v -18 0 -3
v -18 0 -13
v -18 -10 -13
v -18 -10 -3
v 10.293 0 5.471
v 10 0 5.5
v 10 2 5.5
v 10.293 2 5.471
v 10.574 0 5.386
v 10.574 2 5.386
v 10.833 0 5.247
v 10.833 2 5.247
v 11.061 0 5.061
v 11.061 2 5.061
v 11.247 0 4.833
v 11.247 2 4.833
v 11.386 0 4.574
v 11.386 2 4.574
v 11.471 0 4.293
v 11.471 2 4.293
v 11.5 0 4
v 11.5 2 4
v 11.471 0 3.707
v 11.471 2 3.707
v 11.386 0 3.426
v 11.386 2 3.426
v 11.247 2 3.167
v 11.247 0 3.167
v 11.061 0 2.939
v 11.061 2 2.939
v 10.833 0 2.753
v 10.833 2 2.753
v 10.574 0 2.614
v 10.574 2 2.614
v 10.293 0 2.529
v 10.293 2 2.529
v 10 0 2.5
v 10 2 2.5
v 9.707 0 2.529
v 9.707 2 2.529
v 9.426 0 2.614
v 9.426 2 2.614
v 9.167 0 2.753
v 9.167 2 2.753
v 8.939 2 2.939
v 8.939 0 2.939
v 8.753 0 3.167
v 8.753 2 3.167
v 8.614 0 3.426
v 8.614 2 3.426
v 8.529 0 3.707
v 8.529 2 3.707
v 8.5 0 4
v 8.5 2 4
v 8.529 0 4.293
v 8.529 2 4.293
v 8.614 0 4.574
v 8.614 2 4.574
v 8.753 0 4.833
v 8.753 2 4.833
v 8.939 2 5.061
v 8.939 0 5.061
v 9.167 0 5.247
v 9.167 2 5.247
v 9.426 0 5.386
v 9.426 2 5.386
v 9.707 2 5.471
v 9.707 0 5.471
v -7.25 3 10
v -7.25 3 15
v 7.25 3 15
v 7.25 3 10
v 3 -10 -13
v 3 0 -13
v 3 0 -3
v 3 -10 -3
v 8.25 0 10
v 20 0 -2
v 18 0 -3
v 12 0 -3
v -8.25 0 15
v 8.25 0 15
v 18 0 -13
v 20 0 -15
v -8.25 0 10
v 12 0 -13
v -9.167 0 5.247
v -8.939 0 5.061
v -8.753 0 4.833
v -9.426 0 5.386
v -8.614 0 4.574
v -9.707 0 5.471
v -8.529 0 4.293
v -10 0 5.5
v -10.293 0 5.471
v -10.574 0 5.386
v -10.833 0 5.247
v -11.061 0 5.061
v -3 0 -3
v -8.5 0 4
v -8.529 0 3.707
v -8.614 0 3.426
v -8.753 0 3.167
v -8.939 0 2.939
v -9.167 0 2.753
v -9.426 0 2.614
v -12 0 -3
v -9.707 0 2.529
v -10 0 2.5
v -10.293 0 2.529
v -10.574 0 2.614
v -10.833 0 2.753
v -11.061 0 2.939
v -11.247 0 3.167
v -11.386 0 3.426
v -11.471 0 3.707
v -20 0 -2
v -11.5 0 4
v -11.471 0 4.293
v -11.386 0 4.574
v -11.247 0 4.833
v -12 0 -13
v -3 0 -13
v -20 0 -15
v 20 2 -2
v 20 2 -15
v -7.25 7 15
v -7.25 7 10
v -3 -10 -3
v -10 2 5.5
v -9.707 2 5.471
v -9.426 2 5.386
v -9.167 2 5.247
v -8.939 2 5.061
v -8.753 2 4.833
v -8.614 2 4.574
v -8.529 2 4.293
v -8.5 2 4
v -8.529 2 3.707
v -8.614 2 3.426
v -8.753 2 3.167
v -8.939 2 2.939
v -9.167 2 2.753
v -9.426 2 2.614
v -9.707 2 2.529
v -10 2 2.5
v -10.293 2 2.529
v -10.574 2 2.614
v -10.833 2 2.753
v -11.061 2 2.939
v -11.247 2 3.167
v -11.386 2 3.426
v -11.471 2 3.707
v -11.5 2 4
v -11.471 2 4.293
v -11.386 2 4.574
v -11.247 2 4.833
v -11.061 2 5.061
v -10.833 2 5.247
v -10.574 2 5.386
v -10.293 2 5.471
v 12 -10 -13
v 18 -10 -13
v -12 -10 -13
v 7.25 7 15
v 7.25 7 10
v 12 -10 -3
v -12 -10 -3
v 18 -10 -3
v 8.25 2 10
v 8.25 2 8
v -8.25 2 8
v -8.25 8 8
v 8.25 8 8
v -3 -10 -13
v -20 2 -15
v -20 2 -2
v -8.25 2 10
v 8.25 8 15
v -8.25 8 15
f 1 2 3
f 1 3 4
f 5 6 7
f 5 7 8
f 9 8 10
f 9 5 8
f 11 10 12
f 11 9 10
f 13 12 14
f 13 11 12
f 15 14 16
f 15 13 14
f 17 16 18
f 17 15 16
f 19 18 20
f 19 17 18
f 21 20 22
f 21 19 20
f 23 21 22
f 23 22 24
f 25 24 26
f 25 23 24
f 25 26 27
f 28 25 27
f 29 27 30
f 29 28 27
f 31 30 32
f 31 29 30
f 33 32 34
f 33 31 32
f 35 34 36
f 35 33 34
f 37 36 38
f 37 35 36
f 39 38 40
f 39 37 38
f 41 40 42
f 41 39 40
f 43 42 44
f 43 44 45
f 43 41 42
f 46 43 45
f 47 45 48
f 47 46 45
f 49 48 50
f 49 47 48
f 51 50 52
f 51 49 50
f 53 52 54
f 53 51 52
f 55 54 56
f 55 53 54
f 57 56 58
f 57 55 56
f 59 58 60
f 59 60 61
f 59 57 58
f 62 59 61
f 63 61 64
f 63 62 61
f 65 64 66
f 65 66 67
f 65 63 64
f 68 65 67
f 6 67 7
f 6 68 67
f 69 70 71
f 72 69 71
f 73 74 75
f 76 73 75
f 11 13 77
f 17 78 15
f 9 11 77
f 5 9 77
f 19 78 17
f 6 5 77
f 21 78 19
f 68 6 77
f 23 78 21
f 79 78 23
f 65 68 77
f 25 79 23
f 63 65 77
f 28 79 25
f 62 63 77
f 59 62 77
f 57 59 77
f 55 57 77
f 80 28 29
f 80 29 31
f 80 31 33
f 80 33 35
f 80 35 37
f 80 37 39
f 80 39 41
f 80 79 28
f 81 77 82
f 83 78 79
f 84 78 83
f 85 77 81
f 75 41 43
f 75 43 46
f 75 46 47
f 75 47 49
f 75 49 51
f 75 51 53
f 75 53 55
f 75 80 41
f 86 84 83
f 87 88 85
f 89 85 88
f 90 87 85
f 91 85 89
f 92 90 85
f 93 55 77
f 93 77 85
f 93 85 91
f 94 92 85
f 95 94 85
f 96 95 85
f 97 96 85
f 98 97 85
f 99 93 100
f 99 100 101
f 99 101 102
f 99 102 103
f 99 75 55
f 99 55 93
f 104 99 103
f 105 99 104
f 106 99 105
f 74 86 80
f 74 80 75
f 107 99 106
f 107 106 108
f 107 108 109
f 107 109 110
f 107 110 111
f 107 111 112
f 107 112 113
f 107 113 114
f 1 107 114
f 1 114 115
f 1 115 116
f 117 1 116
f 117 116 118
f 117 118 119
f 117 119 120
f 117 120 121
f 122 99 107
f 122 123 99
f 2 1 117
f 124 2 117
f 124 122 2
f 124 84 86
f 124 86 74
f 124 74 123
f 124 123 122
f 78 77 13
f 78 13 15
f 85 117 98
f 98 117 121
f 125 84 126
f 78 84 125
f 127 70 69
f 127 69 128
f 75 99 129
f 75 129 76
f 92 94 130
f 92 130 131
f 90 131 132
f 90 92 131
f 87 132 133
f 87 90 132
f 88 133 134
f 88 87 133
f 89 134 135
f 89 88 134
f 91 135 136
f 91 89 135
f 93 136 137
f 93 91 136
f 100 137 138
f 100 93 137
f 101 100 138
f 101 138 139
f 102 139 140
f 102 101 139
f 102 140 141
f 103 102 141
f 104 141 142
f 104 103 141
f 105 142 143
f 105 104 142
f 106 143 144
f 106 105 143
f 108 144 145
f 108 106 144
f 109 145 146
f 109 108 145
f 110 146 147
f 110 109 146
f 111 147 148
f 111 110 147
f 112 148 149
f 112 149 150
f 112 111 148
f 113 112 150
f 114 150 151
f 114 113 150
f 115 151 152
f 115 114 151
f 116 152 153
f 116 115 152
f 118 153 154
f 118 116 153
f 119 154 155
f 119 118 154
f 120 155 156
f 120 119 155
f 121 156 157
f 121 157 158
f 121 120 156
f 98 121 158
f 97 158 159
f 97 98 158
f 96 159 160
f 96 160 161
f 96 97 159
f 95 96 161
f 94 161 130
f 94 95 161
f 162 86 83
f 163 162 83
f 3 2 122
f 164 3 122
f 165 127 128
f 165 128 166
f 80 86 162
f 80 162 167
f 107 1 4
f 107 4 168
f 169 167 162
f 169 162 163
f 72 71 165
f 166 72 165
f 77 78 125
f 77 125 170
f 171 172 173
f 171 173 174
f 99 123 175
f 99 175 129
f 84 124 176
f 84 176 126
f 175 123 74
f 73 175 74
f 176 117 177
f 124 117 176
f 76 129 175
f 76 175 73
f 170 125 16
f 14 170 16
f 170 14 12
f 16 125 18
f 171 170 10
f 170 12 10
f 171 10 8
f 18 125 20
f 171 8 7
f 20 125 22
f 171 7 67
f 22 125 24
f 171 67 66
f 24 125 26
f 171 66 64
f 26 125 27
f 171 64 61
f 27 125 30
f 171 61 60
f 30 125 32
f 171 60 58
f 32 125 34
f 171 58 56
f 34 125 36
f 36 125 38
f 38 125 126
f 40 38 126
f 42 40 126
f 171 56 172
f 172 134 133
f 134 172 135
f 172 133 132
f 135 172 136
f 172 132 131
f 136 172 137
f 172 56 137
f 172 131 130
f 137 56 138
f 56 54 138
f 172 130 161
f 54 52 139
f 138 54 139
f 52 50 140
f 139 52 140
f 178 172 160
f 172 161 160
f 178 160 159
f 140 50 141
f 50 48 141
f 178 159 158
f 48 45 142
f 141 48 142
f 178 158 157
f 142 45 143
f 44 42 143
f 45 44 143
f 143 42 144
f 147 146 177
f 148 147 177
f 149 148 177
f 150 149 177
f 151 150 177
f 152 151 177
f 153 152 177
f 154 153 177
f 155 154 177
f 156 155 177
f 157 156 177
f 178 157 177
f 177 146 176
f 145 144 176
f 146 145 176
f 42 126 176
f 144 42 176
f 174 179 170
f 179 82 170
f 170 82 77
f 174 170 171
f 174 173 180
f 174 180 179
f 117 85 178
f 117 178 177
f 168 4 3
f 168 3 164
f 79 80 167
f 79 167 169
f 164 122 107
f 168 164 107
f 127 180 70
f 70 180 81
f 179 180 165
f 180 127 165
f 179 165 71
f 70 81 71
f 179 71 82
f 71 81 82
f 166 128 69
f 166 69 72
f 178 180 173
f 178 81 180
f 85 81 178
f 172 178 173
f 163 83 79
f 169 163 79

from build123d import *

# Parameters (mm, degrees)
SKETCH_1_R             = 1.5
EXTRUDE_1_DEPTH        = 2
SKETCH_2_W             = 16.5
SKETCH_2_H             = 7
EXTRUDE_2_DEPTH        = 6
SKETCH_3_W             = 6
SKETCH_3_H             = 10
EXTRUDE_3_DEPTH        = 10
PATTERN_LINEAR_1_COUNT = 2
PATTERN_LINEAR_1_PITCH = 15
PATTERN_LINEAR_2_COUNT = 2
PATTERN_LINEAR_2_PITCH = 15
SKETCH_4_W             = 14.5
SKETCH_4_H             = 4
CUT_EXTRUDE_1_DEPTH    = 5


with BuildPart() as part:
    # 草图1 → 凸台-拉伸1 (new body)
    with BuildSketch(Plane(origin=(0, 0, 0), x_dir=(1, 0, 0), z_dir=(0, 1, 0))):
        Polygon((-20, 15), (20, 15), (20, 2), (8.25, -10), (8.25, -15), (-8.25, -15), (-8.25, -10), (-20, 2), align=None)
        with Locations(Location((-10, -4, 0), (0, 0, 270))):
            Circle(SKETCH_1_R, mode=Mode.SUBTRACT)
        with Locations(Location((10, -4, 0), (0, 0, 270))):
            Circle(SKETCH_1_R, mode=Mode.SUBTRACT)
    extrude(amount=EXTRUDE_1_DEPTH)

    # 草图2 → 凸台-拉伸2 (add)
    with BuildSketch(Plane(origin=(0, 2, 0), x_dir=(1, 0, 0), z_dir=(0, 1, 0))):
        with Locations((0, -11.5)):
            Rectangle(SKETCH_2_W, SKETCH_2_H)
    extrude(amount=EXTRUDE_2_DEPTH)

    # 草图3 → 凸台-拉伸3 (add)
    with BuildSketch(Plane.XZ):
        with Locations((0, -8)):
            Rectangle(SKETCH_3_W, SKETCH_3_H)
    extrude_3 = extrude(amount=EXTRUDE_3_DEPTH)

    # 阵列(线性)1: 凸台-拉伸3 ×2
    with Locations(*[(i * PATTERN_LINEAR_1_PITCH, 0, 0) for i in range(1, PATTERN_LINEAR_1_COUNT)]):
        add(extrude_3)

    # 阵列(线性)2: 凸台-拉伸3 ×2
    with Locations(*[(-i * PATTERN_LINEAR_2_PITCH, 0, 0) for i in range(1, PATTERN_LINEAR_2_COUNT)]):
        add(extrude_3)

    # 草图4 → 切除-拉伸1 (cut)
    with BuildSketch(Plane.XY.offset(15)):
        with Locations((0, 5)):
            Rectangle(SKETCH_4_W, SKETCH_4_H)
    extrude(amount=-CUT_EXTRUDE_1_DEPTH, mode=Mode.SUBTRACT)


solid = part.part
